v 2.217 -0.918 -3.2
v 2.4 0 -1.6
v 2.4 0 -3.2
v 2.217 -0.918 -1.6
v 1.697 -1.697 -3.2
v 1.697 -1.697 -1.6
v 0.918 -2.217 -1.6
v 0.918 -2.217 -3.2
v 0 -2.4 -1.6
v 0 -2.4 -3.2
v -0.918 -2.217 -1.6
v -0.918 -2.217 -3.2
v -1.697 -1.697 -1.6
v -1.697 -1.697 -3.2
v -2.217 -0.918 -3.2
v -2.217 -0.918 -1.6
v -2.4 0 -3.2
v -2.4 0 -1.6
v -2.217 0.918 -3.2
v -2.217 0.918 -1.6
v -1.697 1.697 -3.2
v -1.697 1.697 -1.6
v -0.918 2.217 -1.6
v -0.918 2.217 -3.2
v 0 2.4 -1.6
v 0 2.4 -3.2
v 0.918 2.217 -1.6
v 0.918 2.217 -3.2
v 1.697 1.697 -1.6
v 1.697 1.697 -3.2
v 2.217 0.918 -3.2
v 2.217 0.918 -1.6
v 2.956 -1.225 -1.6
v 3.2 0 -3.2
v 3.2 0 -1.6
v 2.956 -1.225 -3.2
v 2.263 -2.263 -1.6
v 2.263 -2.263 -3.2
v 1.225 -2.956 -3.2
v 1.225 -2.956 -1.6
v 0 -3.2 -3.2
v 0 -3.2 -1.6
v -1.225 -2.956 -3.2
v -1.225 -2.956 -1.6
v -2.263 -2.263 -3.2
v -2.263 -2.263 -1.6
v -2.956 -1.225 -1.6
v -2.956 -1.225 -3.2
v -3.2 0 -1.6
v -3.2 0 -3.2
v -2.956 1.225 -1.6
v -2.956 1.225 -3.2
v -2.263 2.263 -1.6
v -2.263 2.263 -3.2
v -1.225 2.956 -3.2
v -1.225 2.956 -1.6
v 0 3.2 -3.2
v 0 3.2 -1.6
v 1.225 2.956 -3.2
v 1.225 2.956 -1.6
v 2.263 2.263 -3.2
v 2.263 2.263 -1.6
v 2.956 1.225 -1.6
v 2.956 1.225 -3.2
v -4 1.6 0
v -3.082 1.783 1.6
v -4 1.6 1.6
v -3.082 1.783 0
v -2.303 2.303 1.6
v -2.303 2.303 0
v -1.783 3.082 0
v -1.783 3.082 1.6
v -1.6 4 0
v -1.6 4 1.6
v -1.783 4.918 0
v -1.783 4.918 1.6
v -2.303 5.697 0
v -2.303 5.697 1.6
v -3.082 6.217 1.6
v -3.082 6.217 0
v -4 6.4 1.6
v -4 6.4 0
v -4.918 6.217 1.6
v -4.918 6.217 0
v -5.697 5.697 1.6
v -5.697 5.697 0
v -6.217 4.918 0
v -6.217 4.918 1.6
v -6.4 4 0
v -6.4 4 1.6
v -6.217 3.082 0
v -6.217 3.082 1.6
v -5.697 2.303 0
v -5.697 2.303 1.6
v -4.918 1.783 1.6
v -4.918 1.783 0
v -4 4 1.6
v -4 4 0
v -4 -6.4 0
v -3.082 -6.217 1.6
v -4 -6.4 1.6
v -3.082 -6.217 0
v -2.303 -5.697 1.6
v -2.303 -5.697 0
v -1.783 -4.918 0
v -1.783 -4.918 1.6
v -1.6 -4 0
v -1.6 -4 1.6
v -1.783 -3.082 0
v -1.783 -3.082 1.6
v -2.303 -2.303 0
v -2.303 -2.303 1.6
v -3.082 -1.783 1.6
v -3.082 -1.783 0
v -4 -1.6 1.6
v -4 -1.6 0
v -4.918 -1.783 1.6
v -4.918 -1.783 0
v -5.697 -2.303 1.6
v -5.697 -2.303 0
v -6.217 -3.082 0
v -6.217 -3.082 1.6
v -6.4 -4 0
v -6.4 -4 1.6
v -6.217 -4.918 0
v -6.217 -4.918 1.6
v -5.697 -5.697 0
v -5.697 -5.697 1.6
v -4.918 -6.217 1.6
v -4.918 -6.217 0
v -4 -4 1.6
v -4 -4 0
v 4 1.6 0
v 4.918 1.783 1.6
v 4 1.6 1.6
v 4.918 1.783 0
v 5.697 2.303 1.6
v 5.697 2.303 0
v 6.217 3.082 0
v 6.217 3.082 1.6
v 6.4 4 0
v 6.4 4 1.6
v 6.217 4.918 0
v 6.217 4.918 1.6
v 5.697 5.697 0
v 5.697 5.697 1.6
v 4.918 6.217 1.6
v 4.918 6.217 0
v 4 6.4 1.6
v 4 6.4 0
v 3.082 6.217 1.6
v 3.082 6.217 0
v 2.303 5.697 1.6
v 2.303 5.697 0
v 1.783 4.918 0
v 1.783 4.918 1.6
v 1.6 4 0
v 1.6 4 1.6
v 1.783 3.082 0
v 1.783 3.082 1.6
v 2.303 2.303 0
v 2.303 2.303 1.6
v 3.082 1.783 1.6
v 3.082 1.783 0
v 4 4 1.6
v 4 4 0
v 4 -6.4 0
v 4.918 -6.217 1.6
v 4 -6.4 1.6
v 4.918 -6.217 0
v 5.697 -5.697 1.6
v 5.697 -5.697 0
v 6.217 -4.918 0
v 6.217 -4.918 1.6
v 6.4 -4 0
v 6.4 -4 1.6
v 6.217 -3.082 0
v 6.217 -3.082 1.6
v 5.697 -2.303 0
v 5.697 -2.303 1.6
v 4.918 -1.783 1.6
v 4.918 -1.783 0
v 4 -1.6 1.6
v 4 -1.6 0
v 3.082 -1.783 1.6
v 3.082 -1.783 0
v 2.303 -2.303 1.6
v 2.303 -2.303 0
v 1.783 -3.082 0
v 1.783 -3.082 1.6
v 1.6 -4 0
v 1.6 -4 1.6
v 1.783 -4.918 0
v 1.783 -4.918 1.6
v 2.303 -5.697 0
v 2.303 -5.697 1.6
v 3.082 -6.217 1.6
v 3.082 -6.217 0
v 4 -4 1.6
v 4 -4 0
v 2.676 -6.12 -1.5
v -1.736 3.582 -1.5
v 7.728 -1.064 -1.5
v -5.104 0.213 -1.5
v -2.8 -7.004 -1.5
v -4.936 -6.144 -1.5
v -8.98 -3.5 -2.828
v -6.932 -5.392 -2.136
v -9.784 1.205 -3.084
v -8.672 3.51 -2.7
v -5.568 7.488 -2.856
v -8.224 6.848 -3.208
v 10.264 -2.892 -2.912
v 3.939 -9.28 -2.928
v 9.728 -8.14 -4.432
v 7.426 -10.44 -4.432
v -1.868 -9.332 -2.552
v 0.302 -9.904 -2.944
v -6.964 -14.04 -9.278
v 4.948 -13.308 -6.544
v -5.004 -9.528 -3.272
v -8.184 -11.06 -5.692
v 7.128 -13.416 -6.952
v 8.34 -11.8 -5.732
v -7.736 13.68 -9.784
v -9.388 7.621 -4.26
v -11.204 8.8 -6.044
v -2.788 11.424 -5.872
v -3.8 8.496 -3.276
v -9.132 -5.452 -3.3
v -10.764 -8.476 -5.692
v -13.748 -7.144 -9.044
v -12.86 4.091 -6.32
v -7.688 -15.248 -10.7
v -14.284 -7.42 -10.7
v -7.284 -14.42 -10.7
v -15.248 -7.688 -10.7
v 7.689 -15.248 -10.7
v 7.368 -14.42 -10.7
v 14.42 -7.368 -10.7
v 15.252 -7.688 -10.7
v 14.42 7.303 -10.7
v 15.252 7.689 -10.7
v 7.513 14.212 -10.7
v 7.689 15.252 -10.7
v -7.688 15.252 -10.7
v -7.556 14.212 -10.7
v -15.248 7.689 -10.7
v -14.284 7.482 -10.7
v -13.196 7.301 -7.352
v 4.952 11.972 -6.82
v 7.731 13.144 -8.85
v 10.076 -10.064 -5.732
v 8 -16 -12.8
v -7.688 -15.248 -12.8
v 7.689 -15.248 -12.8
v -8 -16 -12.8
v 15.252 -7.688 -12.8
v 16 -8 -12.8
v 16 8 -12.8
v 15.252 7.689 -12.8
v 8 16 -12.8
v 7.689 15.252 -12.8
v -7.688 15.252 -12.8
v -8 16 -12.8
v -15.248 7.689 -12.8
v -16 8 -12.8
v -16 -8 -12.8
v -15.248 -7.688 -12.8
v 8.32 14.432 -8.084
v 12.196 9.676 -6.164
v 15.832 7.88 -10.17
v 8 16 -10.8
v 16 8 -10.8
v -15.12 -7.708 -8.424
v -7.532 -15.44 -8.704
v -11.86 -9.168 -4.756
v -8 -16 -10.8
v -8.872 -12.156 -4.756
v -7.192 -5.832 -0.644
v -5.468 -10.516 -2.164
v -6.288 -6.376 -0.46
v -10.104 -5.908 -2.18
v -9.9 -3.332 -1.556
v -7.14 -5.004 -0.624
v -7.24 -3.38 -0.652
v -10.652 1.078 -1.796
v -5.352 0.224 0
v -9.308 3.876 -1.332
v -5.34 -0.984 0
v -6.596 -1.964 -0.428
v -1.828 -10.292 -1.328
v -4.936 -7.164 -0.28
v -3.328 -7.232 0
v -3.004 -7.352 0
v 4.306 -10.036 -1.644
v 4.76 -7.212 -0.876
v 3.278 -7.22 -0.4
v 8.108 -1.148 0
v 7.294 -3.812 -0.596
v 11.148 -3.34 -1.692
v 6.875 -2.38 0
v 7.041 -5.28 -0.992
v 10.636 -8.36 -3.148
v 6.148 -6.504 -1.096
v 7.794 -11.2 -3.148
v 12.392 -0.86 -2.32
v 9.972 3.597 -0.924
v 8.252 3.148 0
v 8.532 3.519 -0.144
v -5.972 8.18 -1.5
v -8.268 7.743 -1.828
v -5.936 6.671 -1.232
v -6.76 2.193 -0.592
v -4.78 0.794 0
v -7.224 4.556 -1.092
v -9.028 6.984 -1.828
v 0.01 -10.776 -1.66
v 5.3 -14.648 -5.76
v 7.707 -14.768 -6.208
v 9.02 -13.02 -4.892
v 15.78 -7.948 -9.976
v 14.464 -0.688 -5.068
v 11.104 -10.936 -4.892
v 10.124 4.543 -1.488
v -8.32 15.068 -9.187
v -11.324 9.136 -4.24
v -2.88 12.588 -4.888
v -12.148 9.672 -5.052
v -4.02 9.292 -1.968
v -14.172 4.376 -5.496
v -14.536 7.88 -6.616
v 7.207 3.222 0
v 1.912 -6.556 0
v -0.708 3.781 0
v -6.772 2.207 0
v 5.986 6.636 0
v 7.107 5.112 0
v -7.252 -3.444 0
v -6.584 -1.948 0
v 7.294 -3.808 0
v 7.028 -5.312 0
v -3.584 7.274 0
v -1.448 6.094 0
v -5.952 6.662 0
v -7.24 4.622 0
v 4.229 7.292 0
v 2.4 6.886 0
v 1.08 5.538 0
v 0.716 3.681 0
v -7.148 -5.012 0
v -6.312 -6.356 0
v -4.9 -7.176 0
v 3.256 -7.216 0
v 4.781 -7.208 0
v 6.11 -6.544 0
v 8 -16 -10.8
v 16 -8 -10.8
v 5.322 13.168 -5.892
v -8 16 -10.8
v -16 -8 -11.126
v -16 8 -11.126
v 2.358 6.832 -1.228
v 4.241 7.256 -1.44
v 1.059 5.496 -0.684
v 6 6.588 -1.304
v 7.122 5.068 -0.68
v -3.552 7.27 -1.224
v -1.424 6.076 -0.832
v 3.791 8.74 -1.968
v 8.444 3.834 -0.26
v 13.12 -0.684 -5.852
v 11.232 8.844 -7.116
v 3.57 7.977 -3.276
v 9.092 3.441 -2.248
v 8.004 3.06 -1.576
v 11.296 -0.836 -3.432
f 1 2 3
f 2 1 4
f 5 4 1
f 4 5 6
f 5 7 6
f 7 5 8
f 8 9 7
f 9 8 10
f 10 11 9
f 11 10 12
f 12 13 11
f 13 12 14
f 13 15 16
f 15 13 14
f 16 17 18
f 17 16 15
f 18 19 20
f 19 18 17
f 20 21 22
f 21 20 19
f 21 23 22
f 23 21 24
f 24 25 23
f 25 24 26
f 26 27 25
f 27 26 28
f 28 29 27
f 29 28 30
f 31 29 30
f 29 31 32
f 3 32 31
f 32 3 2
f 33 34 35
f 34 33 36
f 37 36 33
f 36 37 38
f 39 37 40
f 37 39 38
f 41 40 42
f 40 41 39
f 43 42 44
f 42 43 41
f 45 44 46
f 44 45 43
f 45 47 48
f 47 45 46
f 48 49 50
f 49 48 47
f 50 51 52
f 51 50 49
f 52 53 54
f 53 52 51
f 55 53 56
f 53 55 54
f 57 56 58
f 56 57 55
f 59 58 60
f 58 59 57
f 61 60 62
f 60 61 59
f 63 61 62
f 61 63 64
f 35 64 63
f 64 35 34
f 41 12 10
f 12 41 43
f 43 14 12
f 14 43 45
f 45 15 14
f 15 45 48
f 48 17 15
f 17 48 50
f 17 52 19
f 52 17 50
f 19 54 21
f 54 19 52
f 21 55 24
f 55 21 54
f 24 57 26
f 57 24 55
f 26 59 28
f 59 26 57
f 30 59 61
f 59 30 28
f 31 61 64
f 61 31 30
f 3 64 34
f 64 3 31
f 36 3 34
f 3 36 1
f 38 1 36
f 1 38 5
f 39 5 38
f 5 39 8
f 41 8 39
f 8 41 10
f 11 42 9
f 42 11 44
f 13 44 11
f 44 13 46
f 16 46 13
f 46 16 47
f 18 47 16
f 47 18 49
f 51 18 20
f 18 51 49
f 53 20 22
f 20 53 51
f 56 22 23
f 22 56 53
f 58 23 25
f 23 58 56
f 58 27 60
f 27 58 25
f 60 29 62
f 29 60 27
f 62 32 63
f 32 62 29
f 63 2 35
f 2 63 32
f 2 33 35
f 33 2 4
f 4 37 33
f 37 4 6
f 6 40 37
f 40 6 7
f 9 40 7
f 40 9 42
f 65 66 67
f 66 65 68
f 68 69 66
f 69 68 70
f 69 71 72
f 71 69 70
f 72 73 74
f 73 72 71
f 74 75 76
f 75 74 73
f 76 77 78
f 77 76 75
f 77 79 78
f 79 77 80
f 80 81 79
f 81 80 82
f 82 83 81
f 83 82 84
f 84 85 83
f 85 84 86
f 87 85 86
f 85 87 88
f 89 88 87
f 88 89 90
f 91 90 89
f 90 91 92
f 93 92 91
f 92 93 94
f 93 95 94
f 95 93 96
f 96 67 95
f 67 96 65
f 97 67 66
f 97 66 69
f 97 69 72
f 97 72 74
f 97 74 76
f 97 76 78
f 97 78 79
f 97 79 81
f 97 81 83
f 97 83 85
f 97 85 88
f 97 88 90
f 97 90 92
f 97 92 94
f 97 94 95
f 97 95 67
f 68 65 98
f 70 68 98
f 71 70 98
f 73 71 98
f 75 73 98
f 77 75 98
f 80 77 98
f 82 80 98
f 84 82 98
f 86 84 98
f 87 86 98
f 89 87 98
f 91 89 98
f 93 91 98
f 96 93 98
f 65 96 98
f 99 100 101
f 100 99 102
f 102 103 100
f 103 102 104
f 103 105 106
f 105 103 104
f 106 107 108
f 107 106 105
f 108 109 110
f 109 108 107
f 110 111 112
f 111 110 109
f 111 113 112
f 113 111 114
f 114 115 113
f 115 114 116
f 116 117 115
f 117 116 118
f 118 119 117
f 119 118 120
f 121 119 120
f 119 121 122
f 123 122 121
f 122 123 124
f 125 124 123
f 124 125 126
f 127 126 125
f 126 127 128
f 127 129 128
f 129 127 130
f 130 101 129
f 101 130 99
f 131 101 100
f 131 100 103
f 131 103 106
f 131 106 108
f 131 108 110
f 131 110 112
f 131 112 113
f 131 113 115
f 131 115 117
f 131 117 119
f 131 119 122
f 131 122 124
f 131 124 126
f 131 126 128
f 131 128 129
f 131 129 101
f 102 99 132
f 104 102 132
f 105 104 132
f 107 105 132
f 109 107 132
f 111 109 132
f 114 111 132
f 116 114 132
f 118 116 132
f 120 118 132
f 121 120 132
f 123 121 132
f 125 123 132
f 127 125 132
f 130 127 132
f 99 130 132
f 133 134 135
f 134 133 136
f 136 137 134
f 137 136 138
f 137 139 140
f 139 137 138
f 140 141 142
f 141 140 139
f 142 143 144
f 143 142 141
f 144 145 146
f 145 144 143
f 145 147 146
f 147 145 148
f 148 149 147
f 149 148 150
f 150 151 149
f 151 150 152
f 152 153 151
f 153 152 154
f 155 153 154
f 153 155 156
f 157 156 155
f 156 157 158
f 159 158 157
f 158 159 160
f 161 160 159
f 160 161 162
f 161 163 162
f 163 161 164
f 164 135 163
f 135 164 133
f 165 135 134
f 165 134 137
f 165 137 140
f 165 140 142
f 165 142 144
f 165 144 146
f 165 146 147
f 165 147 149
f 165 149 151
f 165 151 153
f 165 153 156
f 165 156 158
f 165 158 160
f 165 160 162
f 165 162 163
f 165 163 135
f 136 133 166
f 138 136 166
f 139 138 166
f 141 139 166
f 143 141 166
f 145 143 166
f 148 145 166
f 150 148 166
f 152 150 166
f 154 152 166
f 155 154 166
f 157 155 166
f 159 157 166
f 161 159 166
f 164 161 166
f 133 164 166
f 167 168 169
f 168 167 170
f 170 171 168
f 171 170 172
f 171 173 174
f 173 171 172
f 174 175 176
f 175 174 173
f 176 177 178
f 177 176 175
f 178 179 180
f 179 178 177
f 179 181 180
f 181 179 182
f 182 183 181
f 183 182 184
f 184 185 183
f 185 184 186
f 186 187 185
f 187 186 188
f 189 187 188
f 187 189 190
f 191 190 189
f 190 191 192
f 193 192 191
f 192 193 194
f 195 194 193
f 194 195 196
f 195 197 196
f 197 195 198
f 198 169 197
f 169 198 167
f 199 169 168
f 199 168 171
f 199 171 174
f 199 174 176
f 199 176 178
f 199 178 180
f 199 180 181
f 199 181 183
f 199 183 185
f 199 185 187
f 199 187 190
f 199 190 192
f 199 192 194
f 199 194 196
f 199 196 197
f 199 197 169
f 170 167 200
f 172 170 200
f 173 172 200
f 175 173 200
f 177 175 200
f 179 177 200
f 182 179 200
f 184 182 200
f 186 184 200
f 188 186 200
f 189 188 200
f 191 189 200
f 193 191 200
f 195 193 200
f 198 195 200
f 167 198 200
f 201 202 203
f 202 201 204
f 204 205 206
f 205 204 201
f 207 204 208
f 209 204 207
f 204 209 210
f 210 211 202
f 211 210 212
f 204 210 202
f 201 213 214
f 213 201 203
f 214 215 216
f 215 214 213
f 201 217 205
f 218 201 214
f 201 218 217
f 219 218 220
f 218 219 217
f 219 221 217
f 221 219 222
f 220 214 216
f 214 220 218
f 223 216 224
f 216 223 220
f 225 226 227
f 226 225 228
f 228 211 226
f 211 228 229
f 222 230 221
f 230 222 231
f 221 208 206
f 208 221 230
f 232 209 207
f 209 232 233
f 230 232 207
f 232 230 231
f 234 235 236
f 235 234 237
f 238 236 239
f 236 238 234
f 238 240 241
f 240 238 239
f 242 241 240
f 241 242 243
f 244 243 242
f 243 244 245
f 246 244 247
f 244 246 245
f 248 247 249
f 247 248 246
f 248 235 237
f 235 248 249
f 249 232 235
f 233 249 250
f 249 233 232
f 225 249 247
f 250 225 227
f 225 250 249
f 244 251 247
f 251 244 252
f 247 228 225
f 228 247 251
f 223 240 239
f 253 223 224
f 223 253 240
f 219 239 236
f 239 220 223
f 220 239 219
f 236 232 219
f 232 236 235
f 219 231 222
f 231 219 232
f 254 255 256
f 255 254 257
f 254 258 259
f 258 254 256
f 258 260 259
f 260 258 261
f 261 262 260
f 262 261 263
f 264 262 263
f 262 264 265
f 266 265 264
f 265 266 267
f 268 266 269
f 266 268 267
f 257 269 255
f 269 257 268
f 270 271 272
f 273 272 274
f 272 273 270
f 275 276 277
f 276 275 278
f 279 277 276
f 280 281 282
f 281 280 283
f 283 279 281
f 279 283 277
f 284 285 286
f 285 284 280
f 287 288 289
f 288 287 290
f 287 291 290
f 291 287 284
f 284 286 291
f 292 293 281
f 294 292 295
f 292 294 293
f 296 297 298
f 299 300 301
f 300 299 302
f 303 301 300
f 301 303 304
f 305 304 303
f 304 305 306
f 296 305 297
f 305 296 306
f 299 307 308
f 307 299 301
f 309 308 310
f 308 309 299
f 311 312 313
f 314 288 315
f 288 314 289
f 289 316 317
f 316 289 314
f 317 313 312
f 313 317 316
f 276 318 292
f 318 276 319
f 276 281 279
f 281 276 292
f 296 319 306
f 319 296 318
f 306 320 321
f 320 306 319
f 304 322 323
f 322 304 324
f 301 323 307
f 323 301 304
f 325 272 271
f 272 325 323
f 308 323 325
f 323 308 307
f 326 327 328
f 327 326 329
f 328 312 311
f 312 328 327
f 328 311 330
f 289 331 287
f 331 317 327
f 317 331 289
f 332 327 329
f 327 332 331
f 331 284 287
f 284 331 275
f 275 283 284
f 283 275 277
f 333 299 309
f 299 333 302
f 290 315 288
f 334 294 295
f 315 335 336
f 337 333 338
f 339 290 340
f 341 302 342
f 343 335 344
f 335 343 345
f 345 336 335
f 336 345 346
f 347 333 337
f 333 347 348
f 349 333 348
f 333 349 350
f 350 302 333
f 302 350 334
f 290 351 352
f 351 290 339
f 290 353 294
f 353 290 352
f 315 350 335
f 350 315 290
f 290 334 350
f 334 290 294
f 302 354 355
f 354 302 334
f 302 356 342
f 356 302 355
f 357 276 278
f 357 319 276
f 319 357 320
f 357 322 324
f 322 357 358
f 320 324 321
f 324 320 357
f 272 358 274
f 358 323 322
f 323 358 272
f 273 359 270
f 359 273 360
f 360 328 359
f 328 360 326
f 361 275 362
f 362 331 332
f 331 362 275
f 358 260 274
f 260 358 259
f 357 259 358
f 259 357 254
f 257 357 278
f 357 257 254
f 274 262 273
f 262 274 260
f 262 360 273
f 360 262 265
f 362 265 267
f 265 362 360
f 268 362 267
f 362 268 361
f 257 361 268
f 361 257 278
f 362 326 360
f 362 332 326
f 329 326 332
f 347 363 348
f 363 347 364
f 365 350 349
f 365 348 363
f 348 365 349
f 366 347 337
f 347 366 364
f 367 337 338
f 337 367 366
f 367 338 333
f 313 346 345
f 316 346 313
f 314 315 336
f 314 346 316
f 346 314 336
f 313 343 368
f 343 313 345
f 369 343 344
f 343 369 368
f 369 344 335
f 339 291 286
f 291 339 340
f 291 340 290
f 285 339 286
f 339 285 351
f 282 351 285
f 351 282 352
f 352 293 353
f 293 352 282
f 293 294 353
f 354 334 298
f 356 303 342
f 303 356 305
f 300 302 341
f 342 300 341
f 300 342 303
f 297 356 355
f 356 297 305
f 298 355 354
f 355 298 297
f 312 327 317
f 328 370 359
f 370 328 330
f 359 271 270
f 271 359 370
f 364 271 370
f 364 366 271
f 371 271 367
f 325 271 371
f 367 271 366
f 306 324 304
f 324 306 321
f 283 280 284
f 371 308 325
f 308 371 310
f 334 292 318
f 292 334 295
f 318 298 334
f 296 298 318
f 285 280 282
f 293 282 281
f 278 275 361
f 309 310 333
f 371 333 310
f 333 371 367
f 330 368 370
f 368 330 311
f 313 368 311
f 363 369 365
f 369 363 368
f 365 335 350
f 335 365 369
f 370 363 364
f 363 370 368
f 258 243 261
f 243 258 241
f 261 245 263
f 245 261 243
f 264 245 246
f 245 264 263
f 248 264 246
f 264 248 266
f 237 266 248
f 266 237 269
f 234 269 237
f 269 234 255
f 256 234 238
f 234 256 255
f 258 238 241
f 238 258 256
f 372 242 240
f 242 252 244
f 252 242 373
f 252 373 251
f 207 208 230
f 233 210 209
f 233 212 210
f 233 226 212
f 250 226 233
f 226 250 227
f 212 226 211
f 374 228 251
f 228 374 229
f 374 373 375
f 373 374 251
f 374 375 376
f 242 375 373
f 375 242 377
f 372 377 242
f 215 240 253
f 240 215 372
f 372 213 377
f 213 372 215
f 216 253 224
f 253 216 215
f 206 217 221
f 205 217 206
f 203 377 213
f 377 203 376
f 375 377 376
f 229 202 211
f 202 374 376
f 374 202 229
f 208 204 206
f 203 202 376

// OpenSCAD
use <../lib.scad>
use <42284.scad>
function ldraw_lib__30293() = [
// 0 =Rock  4 x  4 x  1.333 Top
// 0 Name: 30293.dat
// 0 Author: [PTadmin]
// 0 !LDRAW_ORG Part Alias UPDATE 2025-09
// 0 !LICENSE Licensed under CC BY 4.0 : see CAreadme.txt
// 
// 0 BFC CERTIFY CCW
  [0,"BFC","CERTIFY"],
  [0,"BFC","CCW"],
// 
// 0 !HISTORY 2013-12-23 [PTadmin] Official Update 2013-02
// 0 !HISTORY 2025-09-27 [OrionP] Changed winding to CCW
// 0 !HISTORY 2025-09-29 [OrionP] Official Update 2025-09
// 
// 0 // Alias of 42284
// 0 // 30293 is the transparent colour counterpart of 42284
// 
// 1 16 0 0 0 1 0 0 0 1 0 0 0 1 42284.dat
  [1,16,0,0,0,1,0,0,0,1,0,0,0,1, ldraw_lib__42284()],
// 0
];
module ldraw_lib__30293(step=0, col=false, unit=2/5, alt=false, line=0.2, solid=!$preview)
    makepoly(ldraw_lib__30293(), step=step, col=col, unit=unit, alt=alt, line=line, solid=solid);
ldraw_lib__30293(line=0.2);
